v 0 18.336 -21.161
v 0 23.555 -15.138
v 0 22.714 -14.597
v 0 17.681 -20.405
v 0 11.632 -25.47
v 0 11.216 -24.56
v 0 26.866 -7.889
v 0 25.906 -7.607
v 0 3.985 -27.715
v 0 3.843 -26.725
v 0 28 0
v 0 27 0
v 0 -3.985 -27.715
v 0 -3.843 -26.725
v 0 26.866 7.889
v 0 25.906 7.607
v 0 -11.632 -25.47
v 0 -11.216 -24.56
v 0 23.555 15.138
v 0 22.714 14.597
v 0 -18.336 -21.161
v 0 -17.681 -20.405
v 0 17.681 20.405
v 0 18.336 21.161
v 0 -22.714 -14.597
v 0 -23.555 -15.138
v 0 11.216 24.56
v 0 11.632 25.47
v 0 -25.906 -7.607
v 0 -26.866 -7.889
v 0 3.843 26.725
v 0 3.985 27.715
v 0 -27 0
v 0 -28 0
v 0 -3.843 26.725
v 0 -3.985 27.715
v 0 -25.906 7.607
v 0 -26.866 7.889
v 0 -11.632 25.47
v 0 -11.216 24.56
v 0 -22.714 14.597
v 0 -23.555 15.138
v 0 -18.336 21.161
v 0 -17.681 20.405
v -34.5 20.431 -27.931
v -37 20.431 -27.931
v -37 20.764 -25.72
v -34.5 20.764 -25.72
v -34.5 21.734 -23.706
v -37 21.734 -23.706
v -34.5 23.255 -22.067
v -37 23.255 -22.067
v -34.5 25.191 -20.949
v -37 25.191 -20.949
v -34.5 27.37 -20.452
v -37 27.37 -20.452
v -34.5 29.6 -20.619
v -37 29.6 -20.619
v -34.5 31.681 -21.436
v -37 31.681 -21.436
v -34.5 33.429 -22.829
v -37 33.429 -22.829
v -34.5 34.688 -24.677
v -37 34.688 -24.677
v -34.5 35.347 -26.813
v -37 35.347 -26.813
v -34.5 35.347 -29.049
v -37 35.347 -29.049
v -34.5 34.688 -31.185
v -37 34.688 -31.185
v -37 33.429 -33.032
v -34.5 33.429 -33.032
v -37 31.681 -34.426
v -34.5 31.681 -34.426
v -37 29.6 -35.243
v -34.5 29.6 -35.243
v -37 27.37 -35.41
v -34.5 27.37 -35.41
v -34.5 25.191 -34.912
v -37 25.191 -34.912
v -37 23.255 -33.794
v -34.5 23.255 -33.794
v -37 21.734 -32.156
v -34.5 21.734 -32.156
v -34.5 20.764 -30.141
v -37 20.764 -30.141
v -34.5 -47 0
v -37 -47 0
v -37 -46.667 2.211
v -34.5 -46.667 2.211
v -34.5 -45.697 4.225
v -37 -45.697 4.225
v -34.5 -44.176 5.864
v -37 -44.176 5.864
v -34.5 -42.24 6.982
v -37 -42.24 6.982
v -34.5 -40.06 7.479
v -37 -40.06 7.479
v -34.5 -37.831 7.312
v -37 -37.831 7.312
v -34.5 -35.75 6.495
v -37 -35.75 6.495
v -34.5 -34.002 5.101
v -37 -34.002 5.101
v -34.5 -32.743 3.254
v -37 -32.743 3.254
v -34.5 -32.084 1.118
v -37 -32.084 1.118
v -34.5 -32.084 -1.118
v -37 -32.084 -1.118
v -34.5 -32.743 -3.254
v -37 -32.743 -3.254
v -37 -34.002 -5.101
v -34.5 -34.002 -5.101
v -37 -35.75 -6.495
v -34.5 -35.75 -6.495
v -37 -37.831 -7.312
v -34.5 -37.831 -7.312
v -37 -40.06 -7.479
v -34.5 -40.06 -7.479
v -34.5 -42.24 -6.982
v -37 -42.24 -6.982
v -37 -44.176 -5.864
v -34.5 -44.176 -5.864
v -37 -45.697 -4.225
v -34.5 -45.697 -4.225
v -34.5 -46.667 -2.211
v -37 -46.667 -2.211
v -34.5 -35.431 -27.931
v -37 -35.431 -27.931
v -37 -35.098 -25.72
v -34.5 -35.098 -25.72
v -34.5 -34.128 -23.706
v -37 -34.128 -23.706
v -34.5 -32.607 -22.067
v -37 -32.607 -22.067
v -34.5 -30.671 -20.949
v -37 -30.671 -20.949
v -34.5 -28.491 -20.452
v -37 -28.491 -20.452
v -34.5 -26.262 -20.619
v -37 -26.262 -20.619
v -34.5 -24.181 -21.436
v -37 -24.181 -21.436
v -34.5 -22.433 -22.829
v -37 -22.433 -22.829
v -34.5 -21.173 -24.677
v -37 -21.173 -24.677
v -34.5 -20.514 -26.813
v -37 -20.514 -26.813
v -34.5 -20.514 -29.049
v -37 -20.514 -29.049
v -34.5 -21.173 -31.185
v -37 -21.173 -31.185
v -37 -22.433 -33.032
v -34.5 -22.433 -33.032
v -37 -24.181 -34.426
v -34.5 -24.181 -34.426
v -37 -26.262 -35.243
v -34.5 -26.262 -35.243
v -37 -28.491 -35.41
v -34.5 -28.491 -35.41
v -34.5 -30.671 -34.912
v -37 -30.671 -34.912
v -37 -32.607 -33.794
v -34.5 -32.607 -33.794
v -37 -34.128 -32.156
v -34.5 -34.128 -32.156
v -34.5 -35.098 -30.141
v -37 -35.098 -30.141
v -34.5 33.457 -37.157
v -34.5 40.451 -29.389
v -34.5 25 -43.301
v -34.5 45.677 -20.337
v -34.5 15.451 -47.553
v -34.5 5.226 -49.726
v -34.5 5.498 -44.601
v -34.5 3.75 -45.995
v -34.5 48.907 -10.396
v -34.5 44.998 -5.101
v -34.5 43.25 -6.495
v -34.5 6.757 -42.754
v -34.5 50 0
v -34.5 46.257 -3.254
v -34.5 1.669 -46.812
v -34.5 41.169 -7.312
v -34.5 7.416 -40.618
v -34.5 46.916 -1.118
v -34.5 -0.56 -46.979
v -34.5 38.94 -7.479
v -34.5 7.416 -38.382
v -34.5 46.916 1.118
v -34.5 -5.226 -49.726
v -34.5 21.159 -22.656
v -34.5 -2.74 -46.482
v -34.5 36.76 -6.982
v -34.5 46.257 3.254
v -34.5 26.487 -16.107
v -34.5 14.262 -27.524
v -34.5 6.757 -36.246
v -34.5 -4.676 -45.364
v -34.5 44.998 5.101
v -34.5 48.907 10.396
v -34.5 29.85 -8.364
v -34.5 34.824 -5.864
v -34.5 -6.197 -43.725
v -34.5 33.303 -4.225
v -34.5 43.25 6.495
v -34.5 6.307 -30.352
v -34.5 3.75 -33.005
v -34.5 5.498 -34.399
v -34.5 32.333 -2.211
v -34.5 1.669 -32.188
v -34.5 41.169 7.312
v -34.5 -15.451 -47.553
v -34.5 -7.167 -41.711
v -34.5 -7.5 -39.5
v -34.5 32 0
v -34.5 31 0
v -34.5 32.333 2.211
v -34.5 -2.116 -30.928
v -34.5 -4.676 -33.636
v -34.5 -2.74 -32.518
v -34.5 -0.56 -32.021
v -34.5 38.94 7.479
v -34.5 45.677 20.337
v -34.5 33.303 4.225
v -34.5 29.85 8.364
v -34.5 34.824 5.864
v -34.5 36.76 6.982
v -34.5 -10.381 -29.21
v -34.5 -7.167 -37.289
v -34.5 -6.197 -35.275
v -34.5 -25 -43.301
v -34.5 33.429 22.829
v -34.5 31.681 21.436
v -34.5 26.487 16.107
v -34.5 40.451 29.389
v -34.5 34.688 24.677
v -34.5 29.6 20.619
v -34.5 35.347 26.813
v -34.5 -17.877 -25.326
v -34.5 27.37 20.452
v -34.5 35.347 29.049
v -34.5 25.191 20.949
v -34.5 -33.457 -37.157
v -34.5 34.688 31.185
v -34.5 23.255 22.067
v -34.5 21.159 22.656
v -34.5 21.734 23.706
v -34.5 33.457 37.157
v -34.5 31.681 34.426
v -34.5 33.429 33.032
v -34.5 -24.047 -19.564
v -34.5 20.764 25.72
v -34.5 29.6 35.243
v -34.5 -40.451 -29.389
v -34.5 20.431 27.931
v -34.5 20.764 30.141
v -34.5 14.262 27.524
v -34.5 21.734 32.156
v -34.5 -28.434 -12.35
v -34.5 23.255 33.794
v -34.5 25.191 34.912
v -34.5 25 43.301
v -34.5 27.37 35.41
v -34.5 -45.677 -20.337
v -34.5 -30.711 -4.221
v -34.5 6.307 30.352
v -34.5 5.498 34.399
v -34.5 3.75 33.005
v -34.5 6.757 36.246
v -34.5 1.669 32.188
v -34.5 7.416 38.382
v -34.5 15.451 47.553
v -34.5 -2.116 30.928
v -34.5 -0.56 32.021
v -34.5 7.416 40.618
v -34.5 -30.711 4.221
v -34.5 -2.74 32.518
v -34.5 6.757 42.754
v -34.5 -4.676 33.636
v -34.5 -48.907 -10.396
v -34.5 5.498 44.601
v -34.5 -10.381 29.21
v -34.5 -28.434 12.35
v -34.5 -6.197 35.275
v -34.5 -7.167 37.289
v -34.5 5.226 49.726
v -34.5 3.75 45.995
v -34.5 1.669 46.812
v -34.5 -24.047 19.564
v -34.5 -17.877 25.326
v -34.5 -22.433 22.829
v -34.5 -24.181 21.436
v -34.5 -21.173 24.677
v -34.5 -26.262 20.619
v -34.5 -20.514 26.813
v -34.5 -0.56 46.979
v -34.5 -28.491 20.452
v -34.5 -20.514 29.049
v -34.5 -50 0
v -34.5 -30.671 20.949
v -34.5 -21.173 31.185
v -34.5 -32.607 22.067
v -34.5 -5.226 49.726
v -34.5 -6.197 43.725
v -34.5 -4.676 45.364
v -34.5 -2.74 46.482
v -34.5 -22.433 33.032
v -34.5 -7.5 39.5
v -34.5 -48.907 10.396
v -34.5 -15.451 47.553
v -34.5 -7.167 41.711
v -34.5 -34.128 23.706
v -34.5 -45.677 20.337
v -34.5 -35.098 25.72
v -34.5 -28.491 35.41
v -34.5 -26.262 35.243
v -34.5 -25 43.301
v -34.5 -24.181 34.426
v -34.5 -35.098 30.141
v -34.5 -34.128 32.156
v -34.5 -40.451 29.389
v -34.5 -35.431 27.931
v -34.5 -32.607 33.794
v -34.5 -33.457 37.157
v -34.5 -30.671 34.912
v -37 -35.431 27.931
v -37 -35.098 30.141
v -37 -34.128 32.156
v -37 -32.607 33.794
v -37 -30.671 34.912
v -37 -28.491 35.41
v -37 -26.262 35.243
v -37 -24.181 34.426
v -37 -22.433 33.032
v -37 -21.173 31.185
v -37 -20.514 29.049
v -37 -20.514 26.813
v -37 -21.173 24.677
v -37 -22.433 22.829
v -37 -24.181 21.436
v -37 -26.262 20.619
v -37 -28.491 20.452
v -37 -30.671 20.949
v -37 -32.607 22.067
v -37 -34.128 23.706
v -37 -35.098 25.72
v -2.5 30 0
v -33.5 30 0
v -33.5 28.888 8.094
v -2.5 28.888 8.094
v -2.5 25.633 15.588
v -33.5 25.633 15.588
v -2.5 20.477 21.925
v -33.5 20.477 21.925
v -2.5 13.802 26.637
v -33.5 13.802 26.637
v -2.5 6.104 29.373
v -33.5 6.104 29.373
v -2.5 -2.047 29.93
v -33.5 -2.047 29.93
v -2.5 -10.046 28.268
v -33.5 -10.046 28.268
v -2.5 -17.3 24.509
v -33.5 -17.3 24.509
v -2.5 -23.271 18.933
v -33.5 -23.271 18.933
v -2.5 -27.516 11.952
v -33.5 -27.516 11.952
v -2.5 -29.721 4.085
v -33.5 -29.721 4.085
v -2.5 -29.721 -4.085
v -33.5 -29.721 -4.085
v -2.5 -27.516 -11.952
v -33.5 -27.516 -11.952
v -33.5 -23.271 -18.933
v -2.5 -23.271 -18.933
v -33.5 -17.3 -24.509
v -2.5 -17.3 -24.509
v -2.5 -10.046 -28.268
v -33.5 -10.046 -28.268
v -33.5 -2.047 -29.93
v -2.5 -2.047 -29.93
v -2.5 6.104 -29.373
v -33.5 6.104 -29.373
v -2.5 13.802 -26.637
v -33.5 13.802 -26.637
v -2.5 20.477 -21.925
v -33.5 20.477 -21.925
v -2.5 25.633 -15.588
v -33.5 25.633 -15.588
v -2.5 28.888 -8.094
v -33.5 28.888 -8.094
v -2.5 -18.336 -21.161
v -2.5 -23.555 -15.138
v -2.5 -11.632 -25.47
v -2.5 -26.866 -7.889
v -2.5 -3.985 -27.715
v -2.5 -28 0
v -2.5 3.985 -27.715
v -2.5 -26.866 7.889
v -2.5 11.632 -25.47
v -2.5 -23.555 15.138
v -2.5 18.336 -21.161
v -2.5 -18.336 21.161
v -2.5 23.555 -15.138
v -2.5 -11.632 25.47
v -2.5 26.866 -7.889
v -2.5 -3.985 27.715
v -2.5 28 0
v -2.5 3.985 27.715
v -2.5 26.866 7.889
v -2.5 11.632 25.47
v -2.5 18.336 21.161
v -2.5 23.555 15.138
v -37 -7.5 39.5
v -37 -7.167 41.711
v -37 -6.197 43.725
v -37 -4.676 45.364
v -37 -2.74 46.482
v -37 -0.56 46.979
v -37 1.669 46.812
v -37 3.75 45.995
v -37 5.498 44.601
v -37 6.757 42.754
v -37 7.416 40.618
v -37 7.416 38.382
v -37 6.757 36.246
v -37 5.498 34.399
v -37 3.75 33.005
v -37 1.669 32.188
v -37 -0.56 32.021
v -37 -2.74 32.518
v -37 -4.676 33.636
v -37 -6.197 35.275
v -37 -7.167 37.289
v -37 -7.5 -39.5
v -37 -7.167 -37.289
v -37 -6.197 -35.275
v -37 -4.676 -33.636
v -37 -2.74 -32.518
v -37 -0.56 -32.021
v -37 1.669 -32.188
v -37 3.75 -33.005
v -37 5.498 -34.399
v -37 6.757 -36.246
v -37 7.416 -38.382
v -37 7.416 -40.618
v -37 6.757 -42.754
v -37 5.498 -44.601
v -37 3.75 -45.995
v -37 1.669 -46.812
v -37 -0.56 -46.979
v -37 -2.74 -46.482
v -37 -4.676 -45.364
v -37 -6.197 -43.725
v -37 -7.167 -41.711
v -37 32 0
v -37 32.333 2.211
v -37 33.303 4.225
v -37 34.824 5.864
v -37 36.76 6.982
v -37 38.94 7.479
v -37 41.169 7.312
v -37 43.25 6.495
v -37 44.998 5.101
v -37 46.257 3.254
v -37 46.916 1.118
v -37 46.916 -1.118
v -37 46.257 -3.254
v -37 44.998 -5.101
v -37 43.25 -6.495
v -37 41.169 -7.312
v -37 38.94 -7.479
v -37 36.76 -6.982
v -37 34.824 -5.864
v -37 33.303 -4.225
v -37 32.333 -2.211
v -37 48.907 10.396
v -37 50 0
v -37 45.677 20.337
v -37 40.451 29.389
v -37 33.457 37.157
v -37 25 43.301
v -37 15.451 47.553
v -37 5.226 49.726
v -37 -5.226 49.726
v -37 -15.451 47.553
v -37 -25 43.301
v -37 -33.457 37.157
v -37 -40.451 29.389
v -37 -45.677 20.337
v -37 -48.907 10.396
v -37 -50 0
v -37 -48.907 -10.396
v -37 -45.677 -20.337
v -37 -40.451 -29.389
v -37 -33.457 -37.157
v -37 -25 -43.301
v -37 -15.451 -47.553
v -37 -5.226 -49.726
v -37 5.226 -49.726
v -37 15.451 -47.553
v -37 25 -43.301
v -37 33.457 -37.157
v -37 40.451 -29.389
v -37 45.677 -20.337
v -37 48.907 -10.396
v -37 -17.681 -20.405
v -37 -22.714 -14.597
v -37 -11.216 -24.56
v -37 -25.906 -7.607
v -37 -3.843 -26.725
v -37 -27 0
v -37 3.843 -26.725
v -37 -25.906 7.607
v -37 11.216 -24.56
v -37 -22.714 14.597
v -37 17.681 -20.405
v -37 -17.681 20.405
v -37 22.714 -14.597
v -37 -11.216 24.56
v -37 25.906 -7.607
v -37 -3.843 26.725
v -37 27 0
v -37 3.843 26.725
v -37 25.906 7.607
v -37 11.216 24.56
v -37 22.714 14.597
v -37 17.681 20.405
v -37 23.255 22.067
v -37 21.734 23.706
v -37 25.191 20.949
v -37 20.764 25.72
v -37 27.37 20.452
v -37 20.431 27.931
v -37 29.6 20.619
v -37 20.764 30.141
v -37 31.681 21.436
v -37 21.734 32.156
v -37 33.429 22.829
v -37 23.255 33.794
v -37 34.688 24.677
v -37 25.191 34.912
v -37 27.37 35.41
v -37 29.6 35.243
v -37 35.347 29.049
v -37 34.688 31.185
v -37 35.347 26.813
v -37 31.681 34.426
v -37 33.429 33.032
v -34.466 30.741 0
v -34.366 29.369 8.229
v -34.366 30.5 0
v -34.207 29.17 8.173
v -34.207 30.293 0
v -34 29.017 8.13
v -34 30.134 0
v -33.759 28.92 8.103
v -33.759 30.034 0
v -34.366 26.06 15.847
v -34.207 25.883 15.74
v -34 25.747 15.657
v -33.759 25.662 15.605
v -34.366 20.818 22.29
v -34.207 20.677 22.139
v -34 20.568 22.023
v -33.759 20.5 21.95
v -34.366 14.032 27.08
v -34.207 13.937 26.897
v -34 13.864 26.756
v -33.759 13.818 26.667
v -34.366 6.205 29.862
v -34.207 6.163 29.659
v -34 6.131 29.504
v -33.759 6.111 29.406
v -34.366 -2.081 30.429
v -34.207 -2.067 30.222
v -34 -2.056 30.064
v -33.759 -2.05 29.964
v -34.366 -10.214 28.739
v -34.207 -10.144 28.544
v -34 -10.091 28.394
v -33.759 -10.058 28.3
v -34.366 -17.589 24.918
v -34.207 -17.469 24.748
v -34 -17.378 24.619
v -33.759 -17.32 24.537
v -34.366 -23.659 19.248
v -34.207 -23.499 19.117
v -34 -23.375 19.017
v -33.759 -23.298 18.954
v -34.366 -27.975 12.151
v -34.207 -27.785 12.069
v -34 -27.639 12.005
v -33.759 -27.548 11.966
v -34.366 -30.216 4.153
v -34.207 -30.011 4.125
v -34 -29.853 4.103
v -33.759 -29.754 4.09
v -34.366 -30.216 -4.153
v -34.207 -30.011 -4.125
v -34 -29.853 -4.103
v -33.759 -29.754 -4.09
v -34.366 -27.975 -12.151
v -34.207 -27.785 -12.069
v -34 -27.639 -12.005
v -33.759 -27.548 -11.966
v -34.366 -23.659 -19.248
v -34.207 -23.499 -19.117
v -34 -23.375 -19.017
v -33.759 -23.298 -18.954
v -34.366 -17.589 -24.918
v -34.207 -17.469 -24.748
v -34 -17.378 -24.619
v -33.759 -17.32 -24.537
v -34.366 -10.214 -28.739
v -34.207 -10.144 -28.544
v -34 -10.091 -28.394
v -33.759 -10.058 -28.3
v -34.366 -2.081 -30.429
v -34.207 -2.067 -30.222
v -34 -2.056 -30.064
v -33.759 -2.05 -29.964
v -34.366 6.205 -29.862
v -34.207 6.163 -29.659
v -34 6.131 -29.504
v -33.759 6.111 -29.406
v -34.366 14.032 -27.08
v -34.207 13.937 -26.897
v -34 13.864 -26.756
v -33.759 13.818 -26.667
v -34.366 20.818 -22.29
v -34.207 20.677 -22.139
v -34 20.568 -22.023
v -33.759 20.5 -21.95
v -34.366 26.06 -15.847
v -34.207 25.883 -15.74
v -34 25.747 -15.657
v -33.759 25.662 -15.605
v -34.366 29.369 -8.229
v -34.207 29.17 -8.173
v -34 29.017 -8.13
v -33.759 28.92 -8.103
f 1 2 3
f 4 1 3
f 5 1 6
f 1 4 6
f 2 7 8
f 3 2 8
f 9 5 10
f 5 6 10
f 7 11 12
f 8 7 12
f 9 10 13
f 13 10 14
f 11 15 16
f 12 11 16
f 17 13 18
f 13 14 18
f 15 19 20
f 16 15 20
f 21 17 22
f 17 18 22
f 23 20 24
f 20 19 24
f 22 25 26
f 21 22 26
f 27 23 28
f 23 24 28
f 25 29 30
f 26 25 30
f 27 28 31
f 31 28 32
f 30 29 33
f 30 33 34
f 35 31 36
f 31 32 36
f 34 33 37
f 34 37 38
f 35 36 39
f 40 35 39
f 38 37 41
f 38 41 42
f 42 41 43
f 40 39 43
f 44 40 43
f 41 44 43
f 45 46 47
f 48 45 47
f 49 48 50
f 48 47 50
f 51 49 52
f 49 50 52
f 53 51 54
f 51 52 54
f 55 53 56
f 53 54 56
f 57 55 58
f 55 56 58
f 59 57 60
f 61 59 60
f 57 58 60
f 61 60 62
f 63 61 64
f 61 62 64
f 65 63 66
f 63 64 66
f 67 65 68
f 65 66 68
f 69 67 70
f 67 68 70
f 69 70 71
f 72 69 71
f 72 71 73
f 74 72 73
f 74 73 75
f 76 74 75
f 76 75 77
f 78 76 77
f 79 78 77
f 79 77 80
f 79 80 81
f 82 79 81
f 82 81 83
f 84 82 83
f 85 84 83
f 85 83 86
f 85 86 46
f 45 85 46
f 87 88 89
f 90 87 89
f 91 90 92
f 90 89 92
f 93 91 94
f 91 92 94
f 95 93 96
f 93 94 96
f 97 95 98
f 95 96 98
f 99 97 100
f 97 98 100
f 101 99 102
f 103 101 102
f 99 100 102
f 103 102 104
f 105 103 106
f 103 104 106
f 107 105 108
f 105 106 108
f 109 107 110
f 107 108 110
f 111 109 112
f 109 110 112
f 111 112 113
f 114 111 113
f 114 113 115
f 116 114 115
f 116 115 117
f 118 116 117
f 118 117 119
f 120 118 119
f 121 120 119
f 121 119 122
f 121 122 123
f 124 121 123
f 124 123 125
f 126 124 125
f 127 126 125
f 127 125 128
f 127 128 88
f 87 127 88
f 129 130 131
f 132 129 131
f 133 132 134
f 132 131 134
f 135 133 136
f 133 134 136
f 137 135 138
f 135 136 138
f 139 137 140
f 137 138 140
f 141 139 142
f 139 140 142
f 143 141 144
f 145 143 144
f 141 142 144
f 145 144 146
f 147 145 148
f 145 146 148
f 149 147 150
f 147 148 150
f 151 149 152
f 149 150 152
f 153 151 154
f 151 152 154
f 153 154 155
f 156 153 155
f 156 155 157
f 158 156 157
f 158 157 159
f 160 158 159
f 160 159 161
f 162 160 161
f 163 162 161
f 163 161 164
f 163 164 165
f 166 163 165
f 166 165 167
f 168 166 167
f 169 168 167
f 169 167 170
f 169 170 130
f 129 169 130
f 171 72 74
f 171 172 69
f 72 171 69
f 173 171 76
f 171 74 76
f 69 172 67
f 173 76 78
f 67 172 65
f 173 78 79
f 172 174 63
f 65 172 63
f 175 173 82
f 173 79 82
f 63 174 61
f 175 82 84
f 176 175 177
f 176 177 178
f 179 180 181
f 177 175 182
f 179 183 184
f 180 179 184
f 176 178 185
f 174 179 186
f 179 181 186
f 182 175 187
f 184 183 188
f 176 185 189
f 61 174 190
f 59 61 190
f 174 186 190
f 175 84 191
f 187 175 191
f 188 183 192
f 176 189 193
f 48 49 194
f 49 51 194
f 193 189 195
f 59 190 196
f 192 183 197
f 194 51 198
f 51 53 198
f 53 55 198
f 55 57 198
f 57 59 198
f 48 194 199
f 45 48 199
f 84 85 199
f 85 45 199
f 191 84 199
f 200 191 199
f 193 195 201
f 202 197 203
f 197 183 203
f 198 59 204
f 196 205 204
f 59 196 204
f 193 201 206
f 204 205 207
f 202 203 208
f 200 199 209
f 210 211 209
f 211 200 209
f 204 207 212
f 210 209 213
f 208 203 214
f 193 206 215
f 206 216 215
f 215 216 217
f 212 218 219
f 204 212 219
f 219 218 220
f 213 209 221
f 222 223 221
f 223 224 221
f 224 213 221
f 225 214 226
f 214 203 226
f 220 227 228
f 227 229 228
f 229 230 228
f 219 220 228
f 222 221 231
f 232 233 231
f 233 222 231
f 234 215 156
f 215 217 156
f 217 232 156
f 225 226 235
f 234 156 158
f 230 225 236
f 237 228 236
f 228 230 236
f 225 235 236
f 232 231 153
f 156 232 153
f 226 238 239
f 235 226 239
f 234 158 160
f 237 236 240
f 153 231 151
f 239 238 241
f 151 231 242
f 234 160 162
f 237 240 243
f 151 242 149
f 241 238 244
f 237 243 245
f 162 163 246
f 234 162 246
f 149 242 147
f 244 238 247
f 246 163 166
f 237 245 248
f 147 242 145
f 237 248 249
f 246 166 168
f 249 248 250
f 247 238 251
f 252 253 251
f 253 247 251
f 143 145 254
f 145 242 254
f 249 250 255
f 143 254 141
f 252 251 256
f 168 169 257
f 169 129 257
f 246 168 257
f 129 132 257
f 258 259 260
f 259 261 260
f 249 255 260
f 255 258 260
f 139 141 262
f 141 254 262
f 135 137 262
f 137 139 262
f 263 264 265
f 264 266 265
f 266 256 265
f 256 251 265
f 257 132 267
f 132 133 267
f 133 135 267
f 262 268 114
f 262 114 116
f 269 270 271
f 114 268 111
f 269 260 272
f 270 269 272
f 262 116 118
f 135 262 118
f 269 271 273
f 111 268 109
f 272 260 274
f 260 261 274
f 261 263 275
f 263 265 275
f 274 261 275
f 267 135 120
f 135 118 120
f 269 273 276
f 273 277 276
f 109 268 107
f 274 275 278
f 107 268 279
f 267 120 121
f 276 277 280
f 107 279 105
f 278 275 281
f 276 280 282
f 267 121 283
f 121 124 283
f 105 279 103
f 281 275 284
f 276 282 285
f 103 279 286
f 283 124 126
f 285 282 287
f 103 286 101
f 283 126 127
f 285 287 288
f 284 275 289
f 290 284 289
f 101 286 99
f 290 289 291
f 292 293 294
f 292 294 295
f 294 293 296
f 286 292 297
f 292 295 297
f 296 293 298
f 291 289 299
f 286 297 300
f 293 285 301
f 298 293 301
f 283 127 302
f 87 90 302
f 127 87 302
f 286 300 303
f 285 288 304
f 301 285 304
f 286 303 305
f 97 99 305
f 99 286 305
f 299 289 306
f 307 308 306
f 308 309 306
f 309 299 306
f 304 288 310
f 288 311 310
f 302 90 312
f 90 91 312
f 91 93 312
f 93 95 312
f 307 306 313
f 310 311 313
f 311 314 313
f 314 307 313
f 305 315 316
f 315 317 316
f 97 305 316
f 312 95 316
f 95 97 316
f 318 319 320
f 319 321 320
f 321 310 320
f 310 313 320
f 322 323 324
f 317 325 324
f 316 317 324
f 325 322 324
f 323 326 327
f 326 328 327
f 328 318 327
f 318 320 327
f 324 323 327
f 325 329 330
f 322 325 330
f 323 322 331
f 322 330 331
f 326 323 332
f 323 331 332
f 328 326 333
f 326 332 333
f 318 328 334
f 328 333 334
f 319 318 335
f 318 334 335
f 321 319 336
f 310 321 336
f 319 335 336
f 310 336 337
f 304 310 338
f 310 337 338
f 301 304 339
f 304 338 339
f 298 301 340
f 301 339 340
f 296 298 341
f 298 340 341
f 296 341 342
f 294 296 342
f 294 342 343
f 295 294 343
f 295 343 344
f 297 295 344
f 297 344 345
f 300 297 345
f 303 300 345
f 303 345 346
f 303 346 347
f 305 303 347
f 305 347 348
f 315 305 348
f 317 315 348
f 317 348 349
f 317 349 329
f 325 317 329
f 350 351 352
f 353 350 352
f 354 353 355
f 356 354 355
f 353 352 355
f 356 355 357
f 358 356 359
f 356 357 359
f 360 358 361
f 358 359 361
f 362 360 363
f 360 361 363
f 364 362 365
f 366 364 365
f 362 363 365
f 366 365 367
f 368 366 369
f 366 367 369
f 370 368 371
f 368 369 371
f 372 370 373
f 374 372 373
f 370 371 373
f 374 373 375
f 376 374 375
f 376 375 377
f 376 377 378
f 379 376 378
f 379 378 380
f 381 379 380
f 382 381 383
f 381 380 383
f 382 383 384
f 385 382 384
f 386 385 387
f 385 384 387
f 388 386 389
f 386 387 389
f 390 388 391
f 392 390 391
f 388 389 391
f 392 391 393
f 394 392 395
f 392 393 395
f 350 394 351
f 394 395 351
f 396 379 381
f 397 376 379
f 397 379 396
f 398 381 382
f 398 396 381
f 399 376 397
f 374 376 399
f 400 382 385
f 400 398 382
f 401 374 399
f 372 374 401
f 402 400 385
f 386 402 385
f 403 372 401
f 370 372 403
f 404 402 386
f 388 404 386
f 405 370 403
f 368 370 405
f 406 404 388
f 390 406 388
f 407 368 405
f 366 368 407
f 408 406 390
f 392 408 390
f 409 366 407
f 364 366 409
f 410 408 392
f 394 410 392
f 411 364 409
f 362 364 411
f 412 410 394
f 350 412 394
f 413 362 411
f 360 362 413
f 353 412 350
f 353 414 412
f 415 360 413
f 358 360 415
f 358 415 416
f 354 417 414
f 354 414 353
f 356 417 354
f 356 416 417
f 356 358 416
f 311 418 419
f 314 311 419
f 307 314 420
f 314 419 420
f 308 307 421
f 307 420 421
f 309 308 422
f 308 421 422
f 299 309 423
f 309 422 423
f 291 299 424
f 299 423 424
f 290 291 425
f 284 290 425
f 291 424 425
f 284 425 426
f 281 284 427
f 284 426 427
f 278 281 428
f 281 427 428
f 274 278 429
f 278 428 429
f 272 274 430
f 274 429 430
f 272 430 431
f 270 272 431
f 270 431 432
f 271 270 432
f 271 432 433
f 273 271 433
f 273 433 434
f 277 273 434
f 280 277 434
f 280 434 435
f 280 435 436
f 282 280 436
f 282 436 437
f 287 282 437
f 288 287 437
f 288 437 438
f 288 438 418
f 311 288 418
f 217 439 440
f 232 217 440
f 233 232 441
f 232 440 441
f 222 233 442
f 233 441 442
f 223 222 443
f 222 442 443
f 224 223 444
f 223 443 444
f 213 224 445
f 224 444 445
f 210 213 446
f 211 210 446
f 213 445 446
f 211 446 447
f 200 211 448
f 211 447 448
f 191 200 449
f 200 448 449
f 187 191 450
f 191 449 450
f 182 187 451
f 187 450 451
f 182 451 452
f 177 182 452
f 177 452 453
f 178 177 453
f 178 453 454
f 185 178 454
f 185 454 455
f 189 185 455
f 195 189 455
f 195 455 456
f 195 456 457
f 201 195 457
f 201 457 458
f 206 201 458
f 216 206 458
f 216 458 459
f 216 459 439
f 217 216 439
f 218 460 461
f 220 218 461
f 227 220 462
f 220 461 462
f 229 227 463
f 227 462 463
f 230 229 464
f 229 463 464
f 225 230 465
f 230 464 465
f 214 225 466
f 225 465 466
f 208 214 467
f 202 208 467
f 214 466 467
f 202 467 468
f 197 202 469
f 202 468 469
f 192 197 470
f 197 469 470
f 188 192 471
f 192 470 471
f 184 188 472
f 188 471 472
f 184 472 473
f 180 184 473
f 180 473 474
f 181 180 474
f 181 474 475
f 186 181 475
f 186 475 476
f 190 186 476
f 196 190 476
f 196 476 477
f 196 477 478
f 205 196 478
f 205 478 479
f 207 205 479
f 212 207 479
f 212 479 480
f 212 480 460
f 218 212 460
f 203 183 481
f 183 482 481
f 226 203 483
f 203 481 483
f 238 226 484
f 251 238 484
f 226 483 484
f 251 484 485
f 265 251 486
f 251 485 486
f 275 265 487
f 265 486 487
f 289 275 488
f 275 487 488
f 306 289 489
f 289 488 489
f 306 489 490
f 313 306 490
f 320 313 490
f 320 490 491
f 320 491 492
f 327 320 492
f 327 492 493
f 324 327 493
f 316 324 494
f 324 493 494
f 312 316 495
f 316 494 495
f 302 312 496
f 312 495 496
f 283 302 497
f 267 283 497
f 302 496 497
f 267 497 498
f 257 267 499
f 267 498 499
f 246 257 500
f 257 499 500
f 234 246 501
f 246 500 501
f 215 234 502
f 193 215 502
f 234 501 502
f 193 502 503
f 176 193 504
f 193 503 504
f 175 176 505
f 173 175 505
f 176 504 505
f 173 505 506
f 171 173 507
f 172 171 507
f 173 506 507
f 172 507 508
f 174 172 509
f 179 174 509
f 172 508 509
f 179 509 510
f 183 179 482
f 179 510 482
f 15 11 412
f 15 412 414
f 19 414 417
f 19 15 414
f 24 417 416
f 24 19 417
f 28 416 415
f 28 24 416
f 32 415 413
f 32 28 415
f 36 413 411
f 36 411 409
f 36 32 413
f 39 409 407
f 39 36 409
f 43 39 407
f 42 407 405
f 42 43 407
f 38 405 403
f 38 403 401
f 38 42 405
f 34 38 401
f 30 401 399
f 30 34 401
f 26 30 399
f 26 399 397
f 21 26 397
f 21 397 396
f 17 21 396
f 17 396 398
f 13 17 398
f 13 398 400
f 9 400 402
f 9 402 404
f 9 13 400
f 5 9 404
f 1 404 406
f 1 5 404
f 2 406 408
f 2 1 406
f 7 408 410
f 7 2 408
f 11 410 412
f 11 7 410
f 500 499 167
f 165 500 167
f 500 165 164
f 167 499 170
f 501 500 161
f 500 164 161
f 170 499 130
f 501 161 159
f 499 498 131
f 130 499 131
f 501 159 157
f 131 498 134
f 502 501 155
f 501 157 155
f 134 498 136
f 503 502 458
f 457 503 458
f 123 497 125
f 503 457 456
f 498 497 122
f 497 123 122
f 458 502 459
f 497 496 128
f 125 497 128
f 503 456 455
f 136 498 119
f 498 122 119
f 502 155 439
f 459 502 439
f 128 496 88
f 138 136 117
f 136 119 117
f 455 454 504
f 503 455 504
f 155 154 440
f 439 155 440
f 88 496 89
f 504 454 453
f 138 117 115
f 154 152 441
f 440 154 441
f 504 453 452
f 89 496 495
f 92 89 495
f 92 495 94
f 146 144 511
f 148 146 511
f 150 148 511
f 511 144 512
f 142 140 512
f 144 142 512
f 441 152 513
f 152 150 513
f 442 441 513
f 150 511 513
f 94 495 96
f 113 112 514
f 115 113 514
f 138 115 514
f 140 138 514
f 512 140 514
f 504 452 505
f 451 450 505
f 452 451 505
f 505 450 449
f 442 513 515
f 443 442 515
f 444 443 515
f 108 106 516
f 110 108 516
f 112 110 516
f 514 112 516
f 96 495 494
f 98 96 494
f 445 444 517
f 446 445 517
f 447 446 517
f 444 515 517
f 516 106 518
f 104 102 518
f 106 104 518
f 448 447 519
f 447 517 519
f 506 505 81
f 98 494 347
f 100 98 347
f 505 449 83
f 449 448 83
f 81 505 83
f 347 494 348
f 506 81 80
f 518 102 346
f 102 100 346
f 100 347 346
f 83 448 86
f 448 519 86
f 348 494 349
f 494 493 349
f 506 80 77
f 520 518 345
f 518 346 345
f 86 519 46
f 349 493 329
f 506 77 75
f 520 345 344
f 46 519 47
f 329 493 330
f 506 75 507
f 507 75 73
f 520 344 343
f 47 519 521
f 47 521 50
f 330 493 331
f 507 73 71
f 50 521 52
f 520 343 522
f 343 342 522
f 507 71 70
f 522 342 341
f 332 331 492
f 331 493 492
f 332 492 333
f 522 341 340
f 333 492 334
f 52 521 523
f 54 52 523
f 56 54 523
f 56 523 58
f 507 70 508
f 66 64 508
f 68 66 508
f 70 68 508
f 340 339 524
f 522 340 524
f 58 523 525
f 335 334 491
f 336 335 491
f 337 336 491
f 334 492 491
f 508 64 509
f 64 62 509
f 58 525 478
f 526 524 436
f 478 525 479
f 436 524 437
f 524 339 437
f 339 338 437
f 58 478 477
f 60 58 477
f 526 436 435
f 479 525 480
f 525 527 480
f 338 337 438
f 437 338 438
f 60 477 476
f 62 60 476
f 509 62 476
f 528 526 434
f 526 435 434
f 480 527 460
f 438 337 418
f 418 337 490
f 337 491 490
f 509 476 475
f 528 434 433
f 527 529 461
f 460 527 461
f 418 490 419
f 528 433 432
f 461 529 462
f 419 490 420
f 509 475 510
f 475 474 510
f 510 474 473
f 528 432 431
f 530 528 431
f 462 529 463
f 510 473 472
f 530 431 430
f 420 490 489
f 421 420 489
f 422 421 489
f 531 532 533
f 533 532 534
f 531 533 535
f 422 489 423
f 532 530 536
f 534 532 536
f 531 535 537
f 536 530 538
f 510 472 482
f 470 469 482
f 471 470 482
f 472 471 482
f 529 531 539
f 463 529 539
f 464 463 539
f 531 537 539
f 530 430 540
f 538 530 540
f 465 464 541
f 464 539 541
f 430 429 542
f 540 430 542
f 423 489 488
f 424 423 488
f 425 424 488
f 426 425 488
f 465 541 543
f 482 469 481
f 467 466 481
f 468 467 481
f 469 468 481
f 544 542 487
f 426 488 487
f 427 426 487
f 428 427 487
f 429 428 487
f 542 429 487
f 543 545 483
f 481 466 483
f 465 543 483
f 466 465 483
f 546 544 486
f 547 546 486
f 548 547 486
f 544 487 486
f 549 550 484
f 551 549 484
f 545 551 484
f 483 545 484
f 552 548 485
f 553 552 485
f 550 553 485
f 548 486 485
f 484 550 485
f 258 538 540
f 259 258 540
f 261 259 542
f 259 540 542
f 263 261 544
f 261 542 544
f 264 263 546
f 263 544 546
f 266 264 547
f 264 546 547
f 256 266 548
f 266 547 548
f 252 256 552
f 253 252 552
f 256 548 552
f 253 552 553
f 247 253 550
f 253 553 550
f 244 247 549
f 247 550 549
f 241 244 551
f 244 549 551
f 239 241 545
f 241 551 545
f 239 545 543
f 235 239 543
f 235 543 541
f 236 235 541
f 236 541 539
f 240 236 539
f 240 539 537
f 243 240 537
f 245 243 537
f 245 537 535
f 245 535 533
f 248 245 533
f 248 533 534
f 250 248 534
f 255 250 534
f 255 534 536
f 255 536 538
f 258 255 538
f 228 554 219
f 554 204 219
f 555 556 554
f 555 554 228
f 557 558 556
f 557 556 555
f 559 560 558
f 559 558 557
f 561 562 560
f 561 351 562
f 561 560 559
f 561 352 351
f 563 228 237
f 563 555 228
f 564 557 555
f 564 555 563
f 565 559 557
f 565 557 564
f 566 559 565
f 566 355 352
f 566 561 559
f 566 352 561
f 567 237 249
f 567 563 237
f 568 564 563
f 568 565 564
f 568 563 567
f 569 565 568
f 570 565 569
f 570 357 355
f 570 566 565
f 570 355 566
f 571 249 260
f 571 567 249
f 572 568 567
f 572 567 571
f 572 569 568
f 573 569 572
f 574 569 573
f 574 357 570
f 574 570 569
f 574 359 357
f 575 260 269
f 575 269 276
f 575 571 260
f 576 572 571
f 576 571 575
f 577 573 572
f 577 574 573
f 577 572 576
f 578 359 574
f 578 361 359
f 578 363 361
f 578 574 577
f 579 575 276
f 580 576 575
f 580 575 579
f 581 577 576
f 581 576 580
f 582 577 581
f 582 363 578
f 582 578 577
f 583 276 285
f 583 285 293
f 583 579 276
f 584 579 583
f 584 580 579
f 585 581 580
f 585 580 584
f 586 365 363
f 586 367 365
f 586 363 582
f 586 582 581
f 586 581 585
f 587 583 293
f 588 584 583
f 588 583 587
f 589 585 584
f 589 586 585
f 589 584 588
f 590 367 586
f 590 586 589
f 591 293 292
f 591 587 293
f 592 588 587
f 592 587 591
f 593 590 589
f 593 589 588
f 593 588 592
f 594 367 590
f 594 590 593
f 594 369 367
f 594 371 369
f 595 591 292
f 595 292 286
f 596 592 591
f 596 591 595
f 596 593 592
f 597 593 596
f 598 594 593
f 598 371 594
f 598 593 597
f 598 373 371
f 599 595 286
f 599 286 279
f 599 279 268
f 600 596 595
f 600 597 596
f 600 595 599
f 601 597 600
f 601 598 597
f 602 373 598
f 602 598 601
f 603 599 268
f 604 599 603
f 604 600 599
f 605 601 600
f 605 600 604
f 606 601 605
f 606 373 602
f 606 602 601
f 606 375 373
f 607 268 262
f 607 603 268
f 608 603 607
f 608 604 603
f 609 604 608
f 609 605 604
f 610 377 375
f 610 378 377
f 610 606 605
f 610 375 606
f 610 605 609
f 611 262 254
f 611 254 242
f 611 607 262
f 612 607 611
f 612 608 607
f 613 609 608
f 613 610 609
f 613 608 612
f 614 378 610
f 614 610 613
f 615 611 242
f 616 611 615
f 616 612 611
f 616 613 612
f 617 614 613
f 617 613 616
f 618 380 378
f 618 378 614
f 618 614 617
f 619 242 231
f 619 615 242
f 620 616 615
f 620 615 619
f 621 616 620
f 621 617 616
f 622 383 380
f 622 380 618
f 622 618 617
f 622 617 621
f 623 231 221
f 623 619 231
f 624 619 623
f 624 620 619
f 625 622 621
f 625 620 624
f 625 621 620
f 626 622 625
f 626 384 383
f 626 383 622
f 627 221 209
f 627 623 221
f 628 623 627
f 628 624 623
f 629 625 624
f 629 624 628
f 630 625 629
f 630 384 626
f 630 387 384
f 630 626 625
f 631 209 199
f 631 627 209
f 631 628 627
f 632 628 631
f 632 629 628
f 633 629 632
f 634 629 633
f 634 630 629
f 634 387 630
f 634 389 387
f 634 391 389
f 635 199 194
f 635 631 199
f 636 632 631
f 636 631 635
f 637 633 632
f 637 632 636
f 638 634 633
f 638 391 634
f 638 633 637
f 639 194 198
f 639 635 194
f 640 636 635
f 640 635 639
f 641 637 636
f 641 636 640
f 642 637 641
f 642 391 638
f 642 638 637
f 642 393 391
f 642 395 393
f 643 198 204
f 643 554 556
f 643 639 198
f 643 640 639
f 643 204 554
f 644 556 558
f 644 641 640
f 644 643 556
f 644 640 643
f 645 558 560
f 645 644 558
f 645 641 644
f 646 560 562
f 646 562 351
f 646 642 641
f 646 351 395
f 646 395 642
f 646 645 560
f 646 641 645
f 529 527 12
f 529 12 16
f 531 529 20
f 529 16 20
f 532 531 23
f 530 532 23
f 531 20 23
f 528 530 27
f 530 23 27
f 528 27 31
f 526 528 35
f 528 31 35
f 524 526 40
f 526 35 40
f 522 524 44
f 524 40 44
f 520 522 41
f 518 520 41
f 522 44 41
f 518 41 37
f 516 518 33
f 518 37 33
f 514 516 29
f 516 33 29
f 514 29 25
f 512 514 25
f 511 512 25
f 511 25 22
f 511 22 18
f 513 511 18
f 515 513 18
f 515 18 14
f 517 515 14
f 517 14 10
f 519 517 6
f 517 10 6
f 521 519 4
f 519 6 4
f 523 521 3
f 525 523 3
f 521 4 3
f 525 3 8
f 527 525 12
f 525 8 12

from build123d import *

# Parameters (mm, degrees)
F2_R     = 7.5
F3_DEPTH = 5
F4_R     = 55
F4_R_2   = 28
F5_DEPTH = 2.5
F6_R     = 1


with BuildPart() as f1:
    # F0 (on Top) → F1 (revolve)
    with BuildSketch(Plane.XY):
        Polygon((-37, 27), (0, 27), (0, 50), (-2.5, 50), (-2.5, 30), (-34.5, 30), (-34.5, 50), (-37, 50), align=None)
    revolve(axis=Axis((5.071359, 0, 0), (1, 0, 0)))

    # F2 (on face) → F3 (cut)
    with BuildSketch(Plane(origin=(-37, 0, 0), x_dir=(0, -1, 0), z_dir=(-1, 0, 0))):
        with Locations((0, 39.5)):
            Circle(F2_R)
        with Locations((-27.930718, 27.930718)):
            Circle(F2_R)
        with Locations((-39.5, 0)):
            Circle(F2_R)
        with Locations((-27.930718, -27.930718)):
            Circle(F2_R)
        with Locations((0, -39.5)):
            Circle(F2_R)
        with Locations((27.930718, -27.930718)):
            Circle(F2_R)
        with Locations((39.5, 0)):
            Circle(F2_R)
        with Locations((27.930718, 27.930718)):
            Circle(F2_R)
    extrude(amount=-F3_DEPTH, mode=Mode.SUBTRACT)

    # F4 (on face) → F5 (cut)
    with BuildSketch(Plane.YZ):
        Circle(F4_R)
        Circle(F4_R_2, mode=Mode.SUBTRACT)
    extrude(amount=-F5_DEPTH, mode=Mode.SUBTRACT)

    # F6
    f6_edges = [f1.edges().sort_by_distance(p)[0] for p in [
        (-34.5, -30, 0),
    ]]
    fillet(f6_edges, radius=F6_R)


solid = f1.part
